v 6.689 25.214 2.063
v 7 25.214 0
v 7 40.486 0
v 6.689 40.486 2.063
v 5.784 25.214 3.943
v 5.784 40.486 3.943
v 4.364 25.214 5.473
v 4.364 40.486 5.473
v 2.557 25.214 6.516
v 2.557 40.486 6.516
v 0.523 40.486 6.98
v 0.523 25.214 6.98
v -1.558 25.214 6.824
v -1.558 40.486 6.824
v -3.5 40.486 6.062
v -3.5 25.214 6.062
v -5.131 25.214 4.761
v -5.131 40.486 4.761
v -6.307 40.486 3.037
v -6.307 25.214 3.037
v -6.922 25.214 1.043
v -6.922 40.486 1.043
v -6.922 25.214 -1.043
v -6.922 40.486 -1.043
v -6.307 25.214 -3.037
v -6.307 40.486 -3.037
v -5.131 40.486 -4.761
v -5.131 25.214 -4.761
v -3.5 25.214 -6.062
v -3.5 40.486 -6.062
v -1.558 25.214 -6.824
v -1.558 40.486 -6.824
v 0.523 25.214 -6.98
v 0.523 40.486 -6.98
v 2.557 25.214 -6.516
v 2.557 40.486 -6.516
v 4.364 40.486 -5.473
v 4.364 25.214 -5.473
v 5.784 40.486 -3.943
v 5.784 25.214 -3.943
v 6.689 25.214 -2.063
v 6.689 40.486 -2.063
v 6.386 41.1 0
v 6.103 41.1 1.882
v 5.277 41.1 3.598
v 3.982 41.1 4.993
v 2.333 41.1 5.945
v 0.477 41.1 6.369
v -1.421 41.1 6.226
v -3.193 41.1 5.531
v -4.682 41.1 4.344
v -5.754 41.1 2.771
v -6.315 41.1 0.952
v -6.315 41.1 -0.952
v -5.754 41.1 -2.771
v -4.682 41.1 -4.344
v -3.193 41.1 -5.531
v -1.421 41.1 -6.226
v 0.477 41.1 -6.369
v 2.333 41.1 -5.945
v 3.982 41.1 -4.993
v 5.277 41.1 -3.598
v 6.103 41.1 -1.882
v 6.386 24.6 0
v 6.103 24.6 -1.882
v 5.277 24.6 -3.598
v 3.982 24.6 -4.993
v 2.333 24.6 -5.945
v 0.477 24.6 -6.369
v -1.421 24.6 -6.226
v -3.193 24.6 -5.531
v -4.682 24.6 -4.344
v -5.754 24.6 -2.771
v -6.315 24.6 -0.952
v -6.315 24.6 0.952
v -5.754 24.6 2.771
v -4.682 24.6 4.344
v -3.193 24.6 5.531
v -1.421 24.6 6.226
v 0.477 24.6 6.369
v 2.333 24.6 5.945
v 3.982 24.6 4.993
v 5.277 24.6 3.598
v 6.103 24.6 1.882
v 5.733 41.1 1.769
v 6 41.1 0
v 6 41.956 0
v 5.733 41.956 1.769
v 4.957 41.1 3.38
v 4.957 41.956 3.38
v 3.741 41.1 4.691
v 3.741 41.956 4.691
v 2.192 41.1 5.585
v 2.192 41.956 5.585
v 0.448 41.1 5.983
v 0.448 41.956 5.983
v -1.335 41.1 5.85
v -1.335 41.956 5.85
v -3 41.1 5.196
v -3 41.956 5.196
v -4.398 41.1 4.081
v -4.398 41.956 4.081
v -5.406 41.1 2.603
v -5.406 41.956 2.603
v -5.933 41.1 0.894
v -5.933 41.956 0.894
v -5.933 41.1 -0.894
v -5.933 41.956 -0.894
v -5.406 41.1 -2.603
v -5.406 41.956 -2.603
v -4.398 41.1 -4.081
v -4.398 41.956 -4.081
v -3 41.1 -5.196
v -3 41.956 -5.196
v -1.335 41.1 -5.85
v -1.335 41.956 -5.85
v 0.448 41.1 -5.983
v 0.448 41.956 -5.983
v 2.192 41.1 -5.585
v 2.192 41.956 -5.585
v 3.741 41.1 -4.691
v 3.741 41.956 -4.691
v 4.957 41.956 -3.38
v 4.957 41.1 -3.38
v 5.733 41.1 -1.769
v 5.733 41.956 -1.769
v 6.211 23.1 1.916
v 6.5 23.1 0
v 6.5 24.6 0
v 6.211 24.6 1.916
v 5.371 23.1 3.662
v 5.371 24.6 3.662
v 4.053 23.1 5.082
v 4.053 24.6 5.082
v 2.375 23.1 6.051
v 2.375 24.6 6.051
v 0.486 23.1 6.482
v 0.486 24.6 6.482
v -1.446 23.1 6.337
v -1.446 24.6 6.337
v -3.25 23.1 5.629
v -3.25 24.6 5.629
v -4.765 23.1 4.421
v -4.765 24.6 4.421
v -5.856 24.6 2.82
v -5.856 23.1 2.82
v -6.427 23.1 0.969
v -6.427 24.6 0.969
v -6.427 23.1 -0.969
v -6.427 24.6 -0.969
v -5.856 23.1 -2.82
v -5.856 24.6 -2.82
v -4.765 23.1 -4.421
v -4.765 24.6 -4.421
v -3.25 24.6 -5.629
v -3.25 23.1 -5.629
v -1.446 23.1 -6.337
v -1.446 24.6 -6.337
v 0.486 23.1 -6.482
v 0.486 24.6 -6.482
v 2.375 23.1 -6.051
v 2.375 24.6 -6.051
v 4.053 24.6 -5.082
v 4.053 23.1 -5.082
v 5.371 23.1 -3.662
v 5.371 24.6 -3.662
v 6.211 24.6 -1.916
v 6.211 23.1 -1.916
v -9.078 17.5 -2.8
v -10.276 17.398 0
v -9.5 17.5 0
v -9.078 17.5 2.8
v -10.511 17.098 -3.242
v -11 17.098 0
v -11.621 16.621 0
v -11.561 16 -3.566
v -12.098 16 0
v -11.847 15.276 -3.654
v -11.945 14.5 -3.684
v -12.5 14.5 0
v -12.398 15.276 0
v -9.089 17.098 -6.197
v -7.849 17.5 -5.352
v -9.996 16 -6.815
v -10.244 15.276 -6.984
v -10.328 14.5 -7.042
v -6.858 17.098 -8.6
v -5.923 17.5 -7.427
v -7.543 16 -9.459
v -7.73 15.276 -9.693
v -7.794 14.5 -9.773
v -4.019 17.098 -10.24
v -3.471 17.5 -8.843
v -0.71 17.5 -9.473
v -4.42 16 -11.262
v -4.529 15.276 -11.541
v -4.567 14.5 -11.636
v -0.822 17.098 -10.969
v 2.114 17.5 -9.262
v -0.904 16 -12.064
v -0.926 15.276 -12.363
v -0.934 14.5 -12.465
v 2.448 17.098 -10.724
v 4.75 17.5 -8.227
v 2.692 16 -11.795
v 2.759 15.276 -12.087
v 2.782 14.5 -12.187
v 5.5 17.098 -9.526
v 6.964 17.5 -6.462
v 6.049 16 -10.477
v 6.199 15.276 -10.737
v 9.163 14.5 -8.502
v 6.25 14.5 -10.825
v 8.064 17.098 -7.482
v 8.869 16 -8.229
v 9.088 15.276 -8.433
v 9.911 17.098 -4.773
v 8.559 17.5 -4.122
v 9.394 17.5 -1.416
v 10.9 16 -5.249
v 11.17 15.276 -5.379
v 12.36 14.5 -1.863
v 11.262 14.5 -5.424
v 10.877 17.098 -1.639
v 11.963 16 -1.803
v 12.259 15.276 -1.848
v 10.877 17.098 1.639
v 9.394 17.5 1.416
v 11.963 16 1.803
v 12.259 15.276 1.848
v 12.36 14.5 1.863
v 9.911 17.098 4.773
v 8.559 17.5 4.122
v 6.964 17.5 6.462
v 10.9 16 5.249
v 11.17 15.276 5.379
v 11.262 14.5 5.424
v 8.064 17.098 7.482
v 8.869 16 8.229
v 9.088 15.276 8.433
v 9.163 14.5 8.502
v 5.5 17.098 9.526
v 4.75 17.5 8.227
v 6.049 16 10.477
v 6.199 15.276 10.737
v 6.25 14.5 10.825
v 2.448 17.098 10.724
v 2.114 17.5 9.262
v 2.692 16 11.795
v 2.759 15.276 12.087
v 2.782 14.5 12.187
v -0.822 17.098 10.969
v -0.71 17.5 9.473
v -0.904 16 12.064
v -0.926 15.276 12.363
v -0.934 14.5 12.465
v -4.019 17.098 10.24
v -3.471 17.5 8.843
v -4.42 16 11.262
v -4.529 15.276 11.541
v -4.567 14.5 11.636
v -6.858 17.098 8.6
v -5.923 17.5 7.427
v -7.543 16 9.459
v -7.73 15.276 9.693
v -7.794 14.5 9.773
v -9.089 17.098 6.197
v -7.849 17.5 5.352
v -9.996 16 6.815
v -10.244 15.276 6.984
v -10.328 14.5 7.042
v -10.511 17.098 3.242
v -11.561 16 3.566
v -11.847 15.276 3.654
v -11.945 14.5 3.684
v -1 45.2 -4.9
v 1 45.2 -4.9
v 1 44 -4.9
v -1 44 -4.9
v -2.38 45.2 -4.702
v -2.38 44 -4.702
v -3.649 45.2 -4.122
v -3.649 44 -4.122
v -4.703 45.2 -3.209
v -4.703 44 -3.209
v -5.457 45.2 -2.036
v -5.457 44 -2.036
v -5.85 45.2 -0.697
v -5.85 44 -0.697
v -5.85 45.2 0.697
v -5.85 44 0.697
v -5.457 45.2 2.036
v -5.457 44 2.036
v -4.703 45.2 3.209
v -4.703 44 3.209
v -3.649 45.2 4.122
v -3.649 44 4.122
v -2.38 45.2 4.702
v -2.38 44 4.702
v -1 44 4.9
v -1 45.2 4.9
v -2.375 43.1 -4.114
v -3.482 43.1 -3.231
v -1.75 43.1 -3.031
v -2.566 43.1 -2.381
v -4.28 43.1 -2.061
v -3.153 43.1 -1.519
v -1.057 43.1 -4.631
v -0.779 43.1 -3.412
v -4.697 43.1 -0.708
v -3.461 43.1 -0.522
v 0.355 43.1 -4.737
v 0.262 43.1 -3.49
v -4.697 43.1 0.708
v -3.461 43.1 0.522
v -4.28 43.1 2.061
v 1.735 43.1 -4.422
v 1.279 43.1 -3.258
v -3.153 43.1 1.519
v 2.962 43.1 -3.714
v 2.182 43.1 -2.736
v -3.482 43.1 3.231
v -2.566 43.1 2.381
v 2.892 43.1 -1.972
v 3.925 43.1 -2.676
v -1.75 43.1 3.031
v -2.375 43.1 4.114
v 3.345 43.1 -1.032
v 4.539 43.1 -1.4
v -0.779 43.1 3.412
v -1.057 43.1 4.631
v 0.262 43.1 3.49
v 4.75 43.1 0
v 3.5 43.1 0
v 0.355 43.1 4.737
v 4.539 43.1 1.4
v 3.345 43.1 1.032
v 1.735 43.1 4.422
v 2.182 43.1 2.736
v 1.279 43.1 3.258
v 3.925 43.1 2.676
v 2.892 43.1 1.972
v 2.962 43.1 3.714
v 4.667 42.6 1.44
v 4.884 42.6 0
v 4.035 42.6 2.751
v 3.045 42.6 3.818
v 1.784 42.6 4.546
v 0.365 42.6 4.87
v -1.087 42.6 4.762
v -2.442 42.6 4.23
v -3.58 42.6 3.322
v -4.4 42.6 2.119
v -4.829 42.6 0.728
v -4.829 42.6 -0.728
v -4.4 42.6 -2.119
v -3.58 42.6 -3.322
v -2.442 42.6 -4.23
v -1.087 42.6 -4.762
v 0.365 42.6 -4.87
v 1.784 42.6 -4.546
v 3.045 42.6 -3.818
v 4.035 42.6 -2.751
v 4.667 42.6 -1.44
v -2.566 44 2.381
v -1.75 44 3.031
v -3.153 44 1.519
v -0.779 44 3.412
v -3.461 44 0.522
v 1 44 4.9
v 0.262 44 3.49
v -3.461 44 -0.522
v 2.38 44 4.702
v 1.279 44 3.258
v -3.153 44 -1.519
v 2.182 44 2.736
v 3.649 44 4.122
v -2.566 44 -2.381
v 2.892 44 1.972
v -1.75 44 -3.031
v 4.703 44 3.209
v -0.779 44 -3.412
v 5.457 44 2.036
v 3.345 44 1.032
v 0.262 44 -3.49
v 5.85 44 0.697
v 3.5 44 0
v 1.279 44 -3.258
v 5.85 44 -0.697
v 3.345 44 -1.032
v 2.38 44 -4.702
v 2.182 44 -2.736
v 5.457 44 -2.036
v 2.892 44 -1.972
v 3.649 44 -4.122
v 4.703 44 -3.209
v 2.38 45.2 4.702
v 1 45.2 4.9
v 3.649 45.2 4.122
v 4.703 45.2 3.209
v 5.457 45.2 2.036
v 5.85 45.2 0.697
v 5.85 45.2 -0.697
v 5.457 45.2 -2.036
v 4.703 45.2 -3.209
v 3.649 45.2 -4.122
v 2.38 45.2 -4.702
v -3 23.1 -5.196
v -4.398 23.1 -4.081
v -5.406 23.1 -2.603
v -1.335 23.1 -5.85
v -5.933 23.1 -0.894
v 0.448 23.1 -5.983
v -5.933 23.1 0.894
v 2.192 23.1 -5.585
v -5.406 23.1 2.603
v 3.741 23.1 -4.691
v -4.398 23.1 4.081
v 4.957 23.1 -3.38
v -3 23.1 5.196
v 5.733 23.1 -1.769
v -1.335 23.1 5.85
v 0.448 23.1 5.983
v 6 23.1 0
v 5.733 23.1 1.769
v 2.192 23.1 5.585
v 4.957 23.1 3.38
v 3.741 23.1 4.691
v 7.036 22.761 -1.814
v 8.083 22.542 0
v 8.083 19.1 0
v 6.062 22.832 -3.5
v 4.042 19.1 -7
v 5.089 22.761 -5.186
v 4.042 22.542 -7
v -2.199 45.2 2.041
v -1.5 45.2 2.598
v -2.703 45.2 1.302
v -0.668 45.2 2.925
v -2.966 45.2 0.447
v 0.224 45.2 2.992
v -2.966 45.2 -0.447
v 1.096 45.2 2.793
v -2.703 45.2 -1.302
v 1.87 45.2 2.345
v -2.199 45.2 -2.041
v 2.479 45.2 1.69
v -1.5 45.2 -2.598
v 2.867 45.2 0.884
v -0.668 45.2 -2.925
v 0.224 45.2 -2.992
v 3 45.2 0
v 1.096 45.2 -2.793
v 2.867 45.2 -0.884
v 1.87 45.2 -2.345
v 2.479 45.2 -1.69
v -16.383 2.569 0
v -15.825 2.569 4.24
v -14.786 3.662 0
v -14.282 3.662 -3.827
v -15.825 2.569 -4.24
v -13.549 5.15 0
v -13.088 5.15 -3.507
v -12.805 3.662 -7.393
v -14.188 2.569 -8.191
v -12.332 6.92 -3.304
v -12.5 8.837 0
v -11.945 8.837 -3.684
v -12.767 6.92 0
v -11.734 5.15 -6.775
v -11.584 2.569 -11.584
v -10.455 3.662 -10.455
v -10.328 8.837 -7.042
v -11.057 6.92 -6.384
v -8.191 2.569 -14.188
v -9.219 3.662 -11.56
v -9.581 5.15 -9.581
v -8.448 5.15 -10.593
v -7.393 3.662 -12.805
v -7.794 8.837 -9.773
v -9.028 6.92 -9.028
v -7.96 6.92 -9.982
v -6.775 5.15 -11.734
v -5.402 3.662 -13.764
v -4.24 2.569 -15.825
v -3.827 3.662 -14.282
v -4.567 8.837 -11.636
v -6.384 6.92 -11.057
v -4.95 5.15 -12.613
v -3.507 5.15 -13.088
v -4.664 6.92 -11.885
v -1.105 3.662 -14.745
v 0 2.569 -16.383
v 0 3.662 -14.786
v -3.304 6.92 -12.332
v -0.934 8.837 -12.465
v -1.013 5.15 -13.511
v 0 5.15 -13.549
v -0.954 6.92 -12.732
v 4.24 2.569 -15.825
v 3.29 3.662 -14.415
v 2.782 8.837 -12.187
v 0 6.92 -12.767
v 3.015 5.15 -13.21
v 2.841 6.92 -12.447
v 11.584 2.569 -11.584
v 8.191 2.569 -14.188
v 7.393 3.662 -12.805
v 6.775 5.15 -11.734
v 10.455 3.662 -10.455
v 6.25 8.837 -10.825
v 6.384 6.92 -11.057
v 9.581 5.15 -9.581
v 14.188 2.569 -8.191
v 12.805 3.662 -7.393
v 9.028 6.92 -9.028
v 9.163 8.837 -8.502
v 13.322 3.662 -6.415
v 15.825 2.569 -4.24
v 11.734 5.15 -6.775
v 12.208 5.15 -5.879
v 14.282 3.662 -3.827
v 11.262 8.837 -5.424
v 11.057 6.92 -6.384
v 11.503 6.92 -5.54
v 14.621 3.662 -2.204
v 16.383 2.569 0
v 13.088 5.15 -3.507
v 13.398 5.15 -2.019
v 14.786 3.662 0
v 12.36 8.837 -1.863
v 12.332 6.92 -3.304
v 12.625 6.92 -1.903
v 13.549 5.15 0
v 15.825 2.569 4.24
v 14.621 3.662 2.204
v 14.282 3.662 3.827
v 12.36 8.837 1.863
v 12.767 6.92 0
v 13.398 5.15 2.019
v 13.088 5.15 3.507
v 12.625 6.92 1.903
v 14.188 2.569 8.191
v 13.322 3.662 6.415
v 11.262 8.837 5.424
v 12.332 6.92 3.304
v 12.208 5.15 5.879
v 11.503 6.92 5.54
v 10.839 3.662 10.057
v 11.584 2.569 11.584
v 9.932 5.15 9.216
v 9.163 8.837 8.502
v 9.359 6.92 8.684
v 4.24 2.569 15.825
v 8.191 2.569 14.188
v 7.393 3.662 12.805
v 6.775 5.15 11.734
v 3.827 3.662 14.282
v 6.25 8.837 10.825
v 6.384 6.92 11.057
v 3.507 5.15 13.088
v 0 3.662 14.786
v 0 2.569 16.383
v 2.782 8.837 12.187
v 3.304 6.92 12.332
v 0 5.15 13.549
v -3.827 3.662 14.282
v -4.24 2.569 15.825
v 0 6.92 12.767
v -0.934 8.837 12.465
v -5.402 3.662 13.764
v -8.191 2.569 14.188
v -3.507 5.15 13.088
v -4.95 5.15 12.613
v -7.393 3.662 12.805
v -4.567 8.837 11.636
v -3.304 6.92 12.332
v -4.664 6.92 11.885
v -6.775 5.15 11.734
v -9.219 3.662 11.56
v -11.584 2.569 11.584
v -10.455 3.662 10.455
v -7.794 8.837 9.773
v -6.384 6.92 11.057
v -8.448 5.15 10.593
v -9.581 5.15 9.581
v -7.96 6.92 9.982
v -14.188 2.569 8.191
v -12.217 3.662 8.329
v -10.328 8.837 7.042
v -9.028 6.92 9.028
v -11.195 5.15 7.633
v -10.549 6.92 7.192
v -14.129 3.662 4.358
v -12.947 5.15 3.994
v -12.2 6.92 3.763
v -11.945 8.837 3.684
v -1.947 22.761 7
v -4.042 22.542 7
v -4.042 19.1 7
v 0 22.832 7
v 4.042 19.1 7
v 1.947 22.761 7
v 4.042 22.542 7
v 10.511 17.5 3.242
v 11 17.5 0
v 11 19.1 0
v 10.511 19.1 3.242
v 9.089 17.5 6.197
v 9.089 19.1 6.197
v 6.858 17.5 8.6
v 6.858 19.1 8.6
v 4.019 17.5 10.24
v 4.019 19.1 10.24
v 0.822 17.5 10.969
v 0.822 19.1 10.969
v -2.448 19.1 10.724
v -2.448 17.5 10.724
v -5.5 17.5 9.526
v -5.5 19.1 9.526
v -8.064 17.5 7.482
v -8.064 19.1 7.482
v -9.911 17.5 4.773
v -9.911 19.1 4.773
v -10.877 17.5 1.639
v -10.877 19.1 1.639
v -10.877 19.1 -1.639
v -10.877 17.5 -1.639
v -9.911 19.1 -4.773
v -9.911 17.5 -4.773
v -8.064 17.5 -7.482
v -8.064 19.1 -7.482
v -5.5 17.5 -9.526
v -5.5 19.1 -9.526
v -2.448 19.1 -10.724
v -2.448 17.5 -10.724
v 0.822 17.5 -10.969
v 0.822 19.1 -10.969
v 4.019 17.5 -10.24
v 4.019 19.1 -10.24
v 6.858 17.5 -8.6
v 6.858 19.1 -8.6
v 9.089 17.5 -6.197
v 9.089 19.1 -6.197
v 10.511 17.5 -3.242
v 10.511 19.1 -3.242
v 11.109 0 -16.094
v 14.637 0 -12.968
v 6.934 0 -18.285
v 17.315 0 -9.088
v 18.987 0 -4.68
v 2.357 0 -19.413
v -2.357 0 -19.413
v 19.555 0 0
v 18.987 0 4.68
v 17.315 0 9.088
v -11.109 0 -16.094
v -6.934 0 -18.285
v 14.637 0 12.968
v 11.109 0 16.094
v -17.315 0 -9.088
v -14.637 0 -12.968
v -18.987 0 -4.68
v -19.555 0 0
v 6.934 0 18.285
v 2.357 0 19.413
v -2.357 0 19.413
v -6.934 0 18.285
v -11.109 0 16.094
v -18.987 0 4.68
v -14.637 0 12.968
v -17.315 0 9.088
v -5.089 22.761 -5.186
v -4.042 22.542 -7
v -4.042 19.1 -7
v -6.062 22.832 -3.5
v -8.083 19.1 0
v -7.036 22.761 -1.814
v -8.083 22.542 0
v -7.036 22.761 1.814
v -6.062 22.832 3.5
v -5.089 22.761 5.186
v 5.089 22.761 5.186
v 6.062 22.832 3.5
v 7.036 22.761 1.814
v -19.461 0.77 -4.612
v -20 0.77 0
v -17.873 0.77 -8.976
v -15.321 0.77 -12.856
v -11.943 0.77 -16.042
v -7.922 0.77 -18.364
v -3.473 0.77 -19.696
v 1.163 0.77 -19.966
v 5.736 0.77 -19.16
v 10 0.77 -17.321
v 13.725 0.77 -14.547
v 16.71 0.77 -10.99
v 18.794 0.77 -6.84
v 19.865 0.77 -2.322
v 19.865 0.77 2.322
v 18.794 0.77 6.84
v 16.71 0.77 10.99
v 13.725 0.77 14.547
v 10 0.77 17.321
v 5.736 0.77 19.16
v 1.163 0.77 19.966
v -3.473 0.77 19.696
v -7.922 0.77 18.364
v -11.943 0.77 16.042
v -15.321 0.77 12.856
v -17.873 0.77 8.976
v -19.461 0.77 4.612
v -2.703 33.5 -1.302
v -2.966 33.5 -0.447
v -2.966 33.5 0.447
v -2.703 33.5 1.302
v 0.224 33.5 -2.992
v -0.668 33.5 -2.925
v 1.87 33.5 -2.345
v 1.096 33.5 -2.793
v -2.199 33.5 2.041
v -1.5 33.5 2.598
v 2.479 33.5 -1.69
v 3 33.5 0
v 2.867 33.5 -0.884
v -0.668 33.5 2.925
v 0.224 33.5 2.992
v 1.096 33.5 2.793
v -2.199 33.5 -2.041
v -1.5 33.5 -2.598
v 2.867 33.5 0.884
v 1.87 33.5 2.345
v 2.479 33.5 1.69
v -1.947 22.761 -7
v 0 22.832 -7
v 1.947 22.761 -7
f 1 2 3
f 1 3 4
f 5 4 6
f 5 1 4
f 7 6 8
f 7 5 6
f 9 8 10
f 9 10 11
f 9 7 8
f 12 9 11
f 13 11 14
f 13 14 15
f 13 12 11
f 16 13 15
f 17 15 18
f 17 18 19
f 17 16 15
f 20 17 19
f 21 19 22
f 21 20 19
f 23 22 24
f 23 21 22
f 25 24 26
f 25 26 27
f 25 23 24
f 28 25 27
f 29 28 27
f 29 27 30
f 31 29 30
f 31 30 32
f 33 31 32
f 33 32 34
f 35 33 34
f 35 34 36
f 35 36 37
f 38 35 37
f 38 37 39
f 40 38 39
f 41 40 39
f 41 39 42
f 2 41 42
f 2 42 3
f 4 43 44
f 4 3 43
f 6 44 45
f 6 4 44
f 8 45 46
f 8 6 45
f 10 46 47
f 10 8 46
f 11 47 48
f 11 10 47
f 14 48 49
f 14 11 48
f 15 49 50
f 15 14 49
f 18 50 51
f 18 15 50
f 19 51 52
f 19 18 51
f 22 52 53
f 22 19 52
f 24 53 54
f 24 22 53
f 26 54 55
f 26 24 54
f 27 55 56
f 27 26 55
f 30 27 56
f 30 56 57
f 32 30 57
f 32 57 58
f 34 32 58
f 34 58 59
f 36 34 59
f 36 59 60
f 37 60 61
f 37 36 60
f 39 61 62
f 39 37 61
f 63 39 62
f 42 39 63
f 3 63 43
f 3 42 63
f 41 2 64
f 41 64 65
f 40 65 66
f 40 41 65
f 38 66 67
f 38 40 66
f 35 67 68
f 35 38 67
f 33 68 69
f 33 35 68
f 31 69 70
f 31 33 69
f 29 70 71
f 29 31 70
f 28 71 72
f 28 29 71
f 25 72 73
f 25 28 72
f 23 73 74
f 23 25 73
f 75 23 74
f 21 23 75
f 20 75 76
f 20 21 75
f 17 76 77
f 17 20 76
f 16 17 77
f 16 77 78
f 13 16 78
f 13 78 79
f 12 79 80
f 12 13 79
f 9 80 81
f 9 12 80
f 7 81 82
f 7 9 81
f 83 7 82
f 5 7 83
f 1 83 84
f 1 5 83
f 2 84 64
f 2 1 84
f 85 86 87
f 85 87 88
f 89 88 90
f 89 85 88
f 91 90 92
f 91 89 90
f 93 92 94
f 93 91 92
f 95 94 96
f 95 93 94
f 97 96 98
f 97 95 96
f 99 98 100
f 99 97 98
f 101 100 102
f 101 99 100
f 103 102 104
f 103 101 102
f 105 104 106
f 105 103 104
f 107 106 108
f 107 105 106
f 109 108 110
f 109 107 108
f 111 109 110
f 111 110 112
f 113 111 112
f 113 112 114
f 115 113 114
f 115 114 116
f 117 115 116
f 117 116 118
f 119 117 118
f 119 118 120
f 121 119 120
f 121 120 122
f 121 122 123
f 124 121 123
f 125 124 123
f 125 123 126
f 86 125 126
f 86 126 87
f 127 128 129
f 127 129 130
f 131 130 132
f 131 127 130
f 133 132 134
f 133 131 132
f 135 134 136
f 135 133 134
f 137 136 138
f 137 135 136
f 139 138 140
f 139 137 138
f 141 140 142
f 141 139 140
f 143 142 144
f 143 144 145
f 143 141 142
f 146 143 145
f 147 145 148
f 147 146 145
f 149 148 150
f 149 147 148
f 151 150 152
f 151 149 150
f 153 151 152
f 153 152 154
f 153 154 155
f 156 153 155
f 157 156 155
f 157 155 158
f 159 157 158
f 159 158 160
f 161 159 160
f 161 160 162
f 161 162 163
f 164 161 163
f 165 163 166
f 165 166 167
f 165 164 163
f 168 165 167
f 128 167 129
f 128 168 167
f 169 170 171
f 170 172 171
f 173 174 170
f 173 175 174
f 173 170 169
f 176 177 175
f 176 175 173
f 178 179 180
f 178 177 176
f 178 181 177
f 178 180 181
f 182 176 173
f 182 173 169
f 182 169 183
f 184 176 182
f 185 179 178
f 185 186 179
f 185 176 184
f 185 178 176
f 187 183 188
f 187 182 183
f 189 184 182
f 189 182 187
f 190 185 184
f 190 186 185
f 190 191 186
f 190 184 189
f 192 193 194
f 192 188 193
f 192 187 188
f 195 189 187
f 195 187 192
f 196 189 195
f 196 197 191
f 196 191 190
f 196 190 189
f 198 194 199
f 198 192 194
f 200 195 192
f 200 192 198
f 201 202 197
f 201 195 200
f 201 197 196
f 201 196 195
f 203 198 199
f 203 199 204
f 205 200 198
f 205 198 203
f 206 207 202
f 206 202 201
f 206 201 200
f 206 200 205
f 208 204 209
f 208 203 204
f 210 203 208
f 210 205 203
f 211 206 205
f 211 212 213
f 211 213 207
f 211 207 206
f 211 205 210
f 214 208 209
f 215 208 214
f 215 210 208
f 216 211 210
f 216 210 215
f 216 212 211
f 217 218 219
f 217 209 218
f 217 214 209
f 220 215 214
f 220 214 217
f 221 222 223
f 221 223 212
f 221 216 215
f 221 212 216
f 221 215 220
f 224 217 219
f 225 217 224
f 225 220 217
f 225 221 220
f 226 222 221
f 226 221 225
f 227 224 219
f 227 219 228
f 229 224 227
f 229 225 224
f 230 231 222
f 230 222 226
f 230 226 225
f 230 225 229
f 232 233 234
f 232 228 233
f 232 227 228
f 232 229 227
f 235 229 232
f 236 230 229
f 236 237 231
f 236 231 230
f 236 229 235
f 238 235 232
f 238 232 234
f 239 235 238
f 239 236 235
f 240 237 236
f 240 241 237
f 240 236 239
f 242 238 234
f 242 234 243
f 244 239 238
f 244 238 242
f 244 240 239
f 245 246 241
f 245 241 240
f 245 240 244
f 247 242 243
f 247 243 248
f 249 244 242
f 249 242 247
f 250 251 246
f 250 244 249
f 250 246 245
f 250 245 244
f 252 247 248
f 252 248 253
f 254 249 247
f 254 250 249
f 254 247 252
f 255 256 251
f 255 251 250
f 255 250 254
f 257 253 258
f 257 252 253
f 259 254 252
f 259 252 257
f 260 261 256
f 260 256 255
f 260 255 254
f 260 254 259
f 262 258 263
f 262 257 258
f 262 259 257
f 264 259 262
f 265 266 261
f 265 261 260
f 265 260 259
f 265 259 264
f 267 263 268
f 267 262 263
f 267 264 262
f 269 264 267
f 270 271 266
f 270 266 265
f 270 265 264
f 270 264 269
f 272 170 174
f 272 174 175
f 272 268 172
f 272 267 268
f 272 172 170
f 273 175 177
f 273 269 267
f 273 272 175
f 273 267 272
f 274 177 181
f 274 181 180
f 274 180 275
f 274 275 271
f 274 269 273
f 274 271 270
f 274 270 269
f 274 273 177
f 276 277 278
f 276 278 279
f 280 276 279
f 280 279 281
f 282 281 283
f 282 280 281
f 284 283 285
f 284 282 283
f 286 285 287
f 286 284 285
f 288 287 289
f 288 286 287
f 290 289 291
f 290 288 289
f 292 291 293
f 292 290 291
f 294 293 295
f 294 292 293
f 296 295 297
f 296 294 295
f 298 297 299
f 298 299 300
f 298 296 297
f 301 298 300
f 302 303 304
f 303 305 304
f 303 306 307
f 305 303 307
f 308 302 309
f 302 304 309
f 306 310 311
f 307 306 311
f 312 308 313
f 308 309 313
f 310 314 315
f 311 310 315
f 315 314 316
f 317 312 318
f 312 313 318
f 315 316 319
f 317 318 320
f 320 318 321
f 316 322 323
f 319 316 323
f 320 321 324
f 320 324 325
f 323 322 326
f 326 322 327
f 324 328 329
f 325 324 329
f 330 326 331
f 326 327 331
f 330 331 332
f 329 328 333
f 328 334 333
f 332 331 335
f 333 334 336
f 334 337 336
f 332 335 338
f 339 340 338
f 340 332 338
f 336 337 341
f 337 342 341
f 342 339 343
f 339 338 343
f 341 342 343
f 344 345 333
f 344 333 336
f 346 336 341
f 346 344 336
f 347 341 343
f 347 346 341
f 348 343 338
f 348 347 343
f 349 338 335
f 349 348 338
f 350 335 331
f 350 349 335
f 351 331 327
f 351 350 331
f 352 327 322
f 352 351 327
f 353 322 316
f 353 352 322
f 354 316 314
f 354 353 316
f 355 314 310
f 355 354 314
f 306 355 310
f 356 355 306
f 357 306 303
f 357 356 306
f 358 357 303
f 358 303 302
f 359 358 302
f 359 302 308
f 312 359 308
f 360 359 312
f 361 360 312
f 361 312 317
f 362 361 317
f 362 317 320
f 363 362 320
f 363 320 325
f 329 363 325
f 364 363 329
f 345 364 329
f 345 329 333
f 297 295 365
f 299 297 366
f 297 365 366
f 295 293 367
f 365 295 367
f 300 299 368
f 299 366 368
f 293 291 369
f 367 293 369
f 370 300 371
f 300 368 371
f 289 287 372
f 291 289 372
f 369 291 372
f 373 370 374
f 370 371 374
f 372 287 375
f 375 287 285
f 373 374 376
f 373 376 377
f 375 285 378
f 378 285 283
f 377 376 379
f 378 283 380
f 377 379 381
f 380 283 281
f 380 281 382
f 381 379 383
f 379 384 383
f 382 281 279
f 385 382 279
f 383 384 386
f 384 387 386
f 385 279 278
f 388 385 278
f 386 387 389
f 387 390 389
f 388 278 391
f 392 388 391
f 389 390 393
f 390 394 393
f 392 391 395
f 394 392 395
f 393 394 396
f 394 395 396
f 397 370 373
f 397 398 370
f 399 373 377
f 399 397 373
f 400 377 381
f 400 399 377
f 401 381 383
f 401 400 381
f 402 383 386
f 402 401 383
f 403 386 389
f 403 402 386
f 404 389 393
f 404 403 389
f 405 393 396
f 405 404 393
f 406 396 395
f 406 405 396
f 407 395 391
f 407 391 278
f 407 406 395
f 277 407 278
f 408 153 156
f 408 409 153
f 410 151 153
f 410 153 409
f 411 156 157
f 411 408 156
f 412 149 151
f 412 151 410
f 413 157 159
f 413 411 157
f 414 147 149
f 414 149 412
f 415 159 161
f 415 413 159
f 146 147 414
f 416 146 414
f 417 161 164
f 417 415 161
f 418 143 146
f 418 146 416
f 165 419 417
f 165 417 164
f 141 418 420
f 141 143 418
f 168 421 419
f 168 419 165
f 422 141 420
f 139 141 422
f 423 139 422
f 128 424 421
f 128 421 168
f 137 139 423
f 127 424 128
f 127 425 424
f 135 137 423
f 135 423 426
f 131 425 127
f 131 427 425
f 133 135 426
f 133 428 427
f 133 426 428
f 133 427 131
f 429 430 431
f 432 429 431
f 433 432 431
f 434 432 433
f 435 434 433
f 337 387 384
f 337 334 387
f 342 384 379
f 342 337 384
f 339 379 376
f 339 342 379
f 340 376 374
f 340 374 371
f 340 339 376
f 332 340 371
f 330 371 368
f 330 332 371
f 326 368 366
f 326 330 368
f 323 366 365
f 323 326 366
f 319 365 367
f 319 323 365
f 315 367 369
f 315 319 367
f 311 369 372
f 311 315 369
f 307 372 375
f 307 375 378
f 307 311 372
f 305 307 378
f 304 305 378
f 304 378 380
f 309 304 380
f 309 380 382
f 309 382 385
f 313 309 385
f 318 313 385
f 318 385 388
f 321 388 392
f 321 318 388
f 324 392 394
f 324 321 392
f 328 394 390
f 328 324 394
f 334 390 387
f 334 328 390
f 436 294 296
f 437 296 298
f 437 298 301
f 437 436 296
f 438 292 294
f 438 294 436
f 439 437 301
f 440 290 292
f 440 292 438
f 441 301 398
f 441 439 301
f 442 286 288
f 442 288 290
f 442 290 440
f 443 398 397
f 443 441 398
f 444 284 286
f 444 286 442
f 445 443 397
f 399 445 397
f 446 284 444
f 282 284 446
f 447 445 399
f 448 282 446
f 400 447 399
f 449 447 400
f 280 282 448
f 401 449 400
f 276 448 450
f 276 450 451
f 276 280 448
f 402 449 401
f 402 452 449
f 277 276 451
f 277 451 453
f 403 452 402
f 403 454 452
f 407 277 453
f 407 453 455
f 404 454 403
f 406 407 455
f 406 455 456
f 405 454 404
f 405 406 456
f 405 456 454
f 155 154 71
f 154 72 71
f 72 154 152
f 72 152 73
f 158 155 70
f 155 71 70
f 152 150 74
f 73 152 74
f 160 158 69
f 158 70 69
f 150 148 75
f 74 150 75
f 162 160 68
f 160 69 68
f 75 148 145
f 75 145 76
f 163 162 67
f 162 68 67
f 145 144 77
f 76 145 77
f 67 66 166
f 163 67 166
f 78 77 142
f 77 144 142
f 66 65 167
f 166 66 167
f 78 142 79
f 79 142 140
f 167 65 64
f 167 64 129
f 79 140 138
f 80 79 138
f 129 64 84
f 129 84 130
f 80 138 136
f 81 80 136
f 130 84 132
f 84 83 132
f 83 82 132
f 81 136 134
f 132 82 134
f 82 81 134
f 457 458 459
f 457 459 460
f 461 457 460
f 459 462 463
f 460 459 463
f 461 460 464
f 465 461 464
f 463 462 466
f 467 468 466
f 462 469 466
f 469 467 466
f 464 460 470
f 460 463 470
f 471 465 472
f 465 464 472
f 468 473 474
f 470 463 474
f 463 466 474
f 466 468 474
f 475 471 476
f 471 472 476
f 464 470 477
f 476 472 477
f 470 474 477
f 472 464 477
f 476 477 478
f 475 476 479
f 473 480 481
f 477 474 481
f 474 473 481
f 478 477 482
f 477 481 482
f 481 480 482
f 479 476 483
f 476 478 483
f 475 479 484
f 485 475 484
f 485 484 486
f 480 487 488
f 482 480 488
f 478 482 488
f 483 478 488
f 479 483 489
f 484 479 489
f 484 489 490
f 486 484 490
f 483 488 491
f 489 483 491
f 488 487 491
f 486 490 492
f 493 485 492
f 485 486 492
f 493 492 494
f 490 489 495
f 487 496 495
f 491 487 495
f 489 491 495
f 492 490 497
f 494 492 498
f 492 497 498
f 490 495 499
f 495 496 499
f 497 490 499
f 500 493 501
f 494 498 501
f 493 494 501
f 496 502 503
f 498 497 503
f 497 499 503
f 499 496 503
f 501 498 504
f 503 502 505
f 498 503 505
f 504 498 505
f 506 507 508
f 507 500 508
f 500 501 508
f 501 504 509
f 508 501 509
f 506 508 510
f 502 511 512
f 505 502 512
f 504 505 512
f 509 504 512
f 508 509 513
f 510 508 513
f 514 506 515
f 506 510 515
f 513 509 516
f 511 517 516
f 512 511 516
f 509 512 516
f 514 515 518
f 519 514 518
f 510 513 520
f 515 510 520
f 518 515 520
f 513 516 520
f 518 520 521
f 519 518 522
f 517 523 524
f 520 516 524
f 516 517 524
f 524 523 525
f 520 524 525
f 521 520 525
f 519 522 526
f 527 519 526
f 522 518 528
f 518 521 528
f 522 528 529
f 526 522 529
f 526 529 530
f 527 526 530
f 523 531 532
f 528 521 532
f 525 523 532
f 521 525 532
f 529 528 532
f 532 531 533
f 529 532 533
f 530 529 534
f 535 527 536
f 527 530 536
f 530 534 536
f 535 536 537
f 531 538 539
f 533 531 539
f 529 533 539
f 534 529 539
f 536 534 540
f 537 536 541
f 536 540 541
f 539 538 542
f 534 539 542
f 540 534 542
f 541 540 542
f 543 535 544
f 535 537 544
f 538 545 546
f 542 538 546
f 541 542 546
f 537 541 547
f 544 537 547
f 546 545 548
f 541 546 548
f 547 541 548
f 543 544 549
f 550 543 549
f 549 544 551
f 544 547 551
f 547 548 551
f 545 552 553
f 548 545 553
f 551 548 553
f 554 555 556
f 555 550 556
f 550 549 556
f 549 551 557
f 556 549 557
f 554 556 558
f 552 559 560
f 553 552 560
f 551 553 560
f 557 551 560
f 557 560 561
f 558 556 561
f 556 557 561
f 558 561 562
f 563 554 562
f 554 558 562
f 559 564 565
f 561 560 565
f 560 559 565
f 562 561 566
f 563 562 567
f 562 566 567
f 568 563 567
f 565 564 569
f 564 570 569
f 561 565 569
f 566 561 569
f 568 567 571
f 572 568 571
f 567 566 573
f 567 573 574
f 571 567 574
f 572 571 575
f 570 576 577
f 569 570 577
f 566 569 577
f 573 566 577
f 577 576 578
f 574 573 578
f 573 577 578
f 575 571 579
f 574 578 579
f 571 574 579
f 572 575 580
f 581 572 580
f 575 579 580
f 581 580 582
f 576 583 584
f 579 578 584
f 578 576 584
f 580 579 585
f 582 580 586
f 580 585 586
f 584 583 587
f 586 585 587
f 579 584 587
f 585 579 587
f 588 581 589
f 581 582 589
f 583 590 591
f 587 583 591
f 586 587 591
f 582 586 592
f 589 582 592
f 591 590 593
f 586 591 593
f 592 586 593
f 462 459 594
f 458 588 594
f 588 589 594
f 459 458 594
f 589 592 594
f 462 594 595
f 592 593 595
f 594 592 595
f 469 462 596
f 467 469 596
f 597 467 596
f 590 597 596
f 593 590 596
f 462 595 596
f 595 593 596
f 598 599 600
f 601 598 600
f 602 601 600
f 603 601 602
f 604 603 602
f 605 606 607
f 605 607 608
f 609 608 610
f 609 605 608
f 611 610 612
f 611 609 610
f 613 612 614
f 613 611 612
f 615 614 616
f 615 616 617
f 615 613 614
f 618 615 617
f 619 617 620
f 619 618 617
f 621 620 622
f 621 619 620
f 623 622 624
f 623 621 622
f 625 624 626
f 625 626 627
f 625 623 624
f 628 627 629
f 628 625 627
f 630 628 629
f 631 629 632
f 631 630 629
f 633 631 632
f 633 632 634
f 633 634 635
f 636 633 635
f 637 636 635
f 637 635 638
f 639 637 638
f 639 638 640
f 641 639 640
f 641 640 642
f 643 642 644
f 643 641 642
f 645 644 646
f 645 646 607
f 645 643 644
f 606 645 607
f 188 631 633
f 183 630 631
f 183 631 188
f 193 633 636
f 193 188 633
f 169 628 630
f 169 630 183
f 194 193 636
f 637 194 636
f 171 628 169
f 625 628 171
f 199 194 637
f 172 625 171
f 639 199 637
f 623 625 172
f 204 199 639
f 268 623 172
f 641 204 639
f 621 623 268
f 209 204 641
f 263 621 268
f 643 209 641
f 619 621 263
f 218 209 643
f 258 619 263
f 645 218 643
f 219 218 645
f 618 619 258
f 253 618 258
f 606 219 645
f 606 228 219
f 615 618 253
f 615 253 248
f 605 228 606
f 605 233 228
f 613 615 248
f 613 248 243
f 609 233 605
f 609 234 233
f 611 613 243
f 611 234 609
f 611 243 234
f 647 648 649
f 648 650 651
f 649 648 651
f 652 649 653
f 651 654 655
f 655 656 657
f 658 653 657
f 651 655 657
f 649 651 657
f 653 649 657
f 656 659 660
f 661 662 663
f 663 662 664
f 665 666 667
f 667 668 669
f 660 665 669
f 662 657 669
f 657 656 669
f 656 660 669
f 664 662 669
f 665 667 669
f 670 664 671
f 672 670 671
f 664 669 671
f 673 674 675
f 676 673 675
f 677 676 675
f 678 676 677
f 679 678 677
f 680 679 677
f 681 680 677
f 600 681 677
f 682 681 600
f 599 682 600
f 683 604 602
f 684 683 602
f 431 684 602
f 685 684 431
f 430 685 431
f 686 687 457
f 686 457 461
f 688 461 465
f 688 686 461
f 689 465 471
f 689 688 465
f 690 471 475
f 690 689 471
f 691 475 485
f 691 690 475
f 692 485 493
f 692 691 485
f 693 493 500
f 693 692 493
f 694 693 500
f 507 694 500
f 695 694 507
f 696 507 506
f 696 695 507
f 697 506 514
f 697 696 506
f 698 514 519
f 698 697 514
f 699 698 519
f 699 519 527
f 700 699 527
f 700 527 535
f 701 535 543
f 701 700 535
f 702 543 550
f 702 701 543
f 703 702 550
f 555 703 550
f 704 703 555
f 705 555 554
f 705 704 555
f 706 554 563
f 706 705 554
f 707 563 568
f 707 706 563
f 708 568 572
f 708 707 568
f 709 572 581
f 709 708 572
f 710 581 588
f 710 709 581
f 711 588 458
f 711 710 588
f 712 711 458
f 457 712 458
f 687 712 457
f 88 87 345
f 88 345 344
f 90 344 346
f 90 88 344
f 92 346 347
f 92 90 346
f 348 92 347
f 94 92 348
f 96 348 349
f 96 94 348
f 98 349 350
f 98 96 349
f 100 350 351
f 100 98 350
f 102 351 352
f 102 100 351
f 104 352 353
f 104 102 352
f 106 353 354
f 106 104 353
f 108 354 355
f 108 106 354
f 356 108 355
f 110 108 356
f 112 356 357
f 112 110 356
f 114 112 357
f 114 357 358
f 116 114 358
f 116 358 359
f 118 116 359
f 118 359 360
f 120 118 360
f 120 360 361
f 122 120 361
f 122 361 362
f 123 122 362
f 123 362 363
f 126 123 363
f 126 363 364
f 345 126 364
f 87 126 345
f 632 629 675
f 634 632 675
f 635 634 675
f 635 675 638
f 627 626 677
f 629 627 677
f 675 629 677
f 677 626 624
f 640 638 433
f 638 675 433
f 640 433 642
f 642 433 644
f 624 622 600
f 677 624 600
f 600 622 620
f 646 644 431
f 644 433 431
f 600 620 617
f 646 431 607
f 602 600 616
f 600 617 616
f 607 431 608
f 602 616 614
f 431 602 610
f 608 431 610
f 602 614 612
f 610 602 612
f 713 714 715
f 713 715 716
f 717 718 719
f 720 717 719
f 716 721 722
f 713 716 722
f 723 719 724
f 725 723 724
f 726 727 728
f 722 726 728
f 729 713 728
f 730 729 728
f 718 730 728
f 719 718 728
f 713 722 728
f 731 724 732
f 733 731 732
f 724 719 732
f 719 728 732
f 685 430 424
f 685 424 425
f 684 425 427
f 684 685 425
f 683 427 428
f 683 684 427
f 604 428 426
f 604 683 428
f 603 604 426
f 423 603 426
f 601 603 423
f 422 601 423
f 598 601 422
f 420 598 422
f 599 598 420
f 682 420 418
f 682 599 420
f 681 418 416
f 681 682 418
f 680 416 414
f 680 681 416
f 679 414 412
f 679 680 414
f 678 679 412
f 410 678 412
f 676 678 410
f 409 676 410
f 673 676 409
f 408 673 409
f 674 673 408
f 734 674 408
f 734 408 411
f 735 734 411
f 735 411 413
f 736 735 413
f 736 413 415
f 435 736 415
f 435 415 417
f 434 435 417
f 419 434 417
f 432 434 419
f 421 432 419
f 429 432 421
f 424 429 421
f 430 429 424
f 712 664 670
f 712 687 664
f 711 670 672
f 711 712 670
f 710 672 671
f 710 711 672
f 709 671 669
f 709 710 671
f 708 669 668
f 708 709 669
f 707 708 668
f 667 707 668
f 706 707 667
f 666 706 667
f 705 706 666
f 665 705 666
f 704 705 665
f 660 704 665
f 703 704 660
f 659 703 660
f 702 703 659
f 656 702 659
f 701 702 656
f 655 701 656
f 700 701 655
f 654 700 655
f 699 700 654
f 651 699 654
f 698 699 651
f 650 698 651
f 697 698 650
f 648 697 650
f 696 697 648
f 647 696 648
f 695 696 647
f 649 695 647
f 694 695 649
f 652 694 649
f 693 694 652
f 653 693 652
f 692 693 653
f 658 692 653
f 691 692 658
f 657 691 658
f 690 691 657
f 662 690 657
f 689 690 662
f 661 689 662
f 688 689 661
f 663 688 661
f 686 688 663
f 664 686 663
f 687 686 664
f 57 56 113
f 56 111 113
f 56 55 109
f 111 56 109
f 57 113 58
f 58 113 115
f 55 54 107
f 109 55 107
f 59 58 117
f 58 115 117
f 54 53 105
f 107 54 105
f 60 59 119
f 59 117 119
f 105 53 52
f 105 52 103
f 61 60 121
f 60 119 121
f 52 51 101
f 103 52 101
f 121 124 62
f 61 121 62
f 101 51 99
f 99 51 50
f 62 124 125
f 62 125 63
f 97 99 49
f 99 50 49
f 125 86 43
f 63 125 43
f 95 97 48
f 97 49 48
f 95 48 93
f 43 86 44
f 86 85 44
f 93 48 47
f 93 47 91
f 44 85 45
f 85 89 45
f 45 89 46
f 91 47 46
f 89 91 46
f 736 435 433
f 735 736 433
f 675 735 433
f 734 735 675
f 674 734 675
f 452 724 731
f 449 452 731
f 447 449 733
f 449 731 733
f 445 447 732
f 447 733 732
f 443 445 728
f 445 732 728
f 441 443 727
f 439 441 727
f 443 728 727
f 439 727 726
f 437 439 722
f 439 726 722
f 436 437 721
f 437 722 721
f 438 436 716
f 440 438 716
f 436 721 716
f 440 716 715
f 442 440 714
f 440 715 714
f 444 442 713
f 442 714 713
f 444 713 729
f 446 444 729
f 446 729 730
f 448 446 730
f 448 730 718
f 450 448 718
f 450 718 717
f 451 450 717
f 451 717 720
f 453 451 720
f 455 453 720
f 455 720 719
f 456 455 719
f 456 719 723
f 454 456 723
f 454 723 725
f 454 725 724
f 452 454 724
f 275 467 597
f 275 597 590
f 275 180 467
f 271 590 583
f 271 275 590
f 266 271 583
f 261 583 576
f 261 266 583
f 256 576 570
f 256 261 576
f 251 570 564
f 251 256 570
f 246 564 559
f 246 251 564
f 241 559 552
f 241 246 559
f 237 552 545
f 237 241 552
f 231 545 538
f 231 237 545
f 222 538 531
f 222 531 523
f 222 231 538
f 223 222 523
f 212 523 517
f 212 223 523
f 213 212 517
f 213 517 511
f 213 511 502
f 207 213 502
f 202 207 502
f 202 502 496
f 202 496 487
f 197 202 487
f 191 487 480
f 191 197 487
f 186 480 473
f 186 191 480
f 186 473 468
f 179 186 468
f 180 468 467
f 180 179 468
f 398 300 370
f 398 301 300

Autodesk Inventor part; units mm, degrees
sketch "Sketch_1" plane through (0, 45.2, 0) normal (0, 1, 0) x (1, 0, 0)
  arc A0 (-1, 4.9) -> (-1, -4.9) centre (-1, 0) ccw
  line L0 (-1, -4.9) -> (1, -4.9)
  arc A1 (1, -4.9) -> (1, 4.9) centre (1, 0) ccw
  line L1 (1, 4.9) -> (-1, 4.9)
extrude "Extrusion1" add sketch "Sketch_1" against normal blind 1.2
sketch "Sketch_2" plane through (0, 0, 0) normal (0, 0, 1) x (1, 0, 0)
  line L0 (0, 41.1) -> (0, 44)
  line L1 (0, 44) -> (3.5, 44)
  line L2 (3.5, 44) -> (3.5, 43.1)
  line L3 (3.5, 43.1) -> (4.75, 43.1)
  line L4 (4.75, 43.1) -> (4.884, 42.6)
  line L5 (4.884, 42.6) -> (6, 41.9557)
  line L6 (6, 41.9557) -> (6, 41.1)
  line L7 (6, 41.1) -> (0, 41.1)
  line L8 (0, 41.1) -> (0, 44)
revolve "Revolution1" add sketch "Sketch_2" angle 360 about axis through (0, 41.1, 0) along (0, -1, 0)
sketch "Sketch_5" plane through (0, 0, 0) normal (0, 0, 1) x (1, 0, 0)
  line L0 (0, 24.6) -> (0, 41.1)
  line L1 (0, 41.1) -> (6.3865, 41.1)
  line L2 (6.3865, 41.1) -> (7, 40.4865)
  line L3 (7, 40.4865) -> (7, 25.2135)
  line L4 (7, 25.2135) -> (6.3865, 24.6)
  line L5 (6.3865, 24.6) -> (0, 24.6)
  line L6 (0, 24.6) -> (0, 41.1)
revolve "Revolution2" add sketch "Sketch_5" angle 360 about axis through (0, 24.6, 0) along (0, -1, 0)
thread "Thread1" size "M14x1" class "6g" standard "ISO Metric profile" full length
sketch "Sketch_6" plane through (0, 0, 0) normal (0, 0, 1) x (1, 0, 0)
  line L0 (0, 23.1) -> (0, 24.6)
  line L1 (0, 24.6) -> (6.5, 24.6)
  line L2 (6.5, 24.6) -> (6.5, 23.1)
  line L3 (6.5, 23.1) -> (0, 23.1)
  line L4 (0, 23.1) -> (0, 24.6)
revolve "Revolution3" add sketch "Sketch_6" angle 360 about axis through (0, 23.1, 0) along (0, -1, 0)
sketch "Sketch_8" plane through (0, 0, 0) normal (0, 0, 1) x (1, 0, 0)
  line L0 (0, 17.5) -> (0, 23.1)
  line L1 (0, 23.1) -> (6, 23.1)
  line L2 (6, 23.1) -> (8.4, 22.4569)
  line L3 (8.4, 22.4569) -> (8.4, 18.1431)
  line L4 (8.4, 18.1431) -> (6, 17.5)
  line L5 (6, 17.5) -> (0, 17.5)
  line L6 (0, 17.5) -> (0, 23.1)
revolve "Revolution4" add sketch "Sketch_8" angle 360 about axis through (0, 17.5, 0) along (0, -1, 0)
sketch "Sketch_9" plane through (0, 23.1, 0) normal (0, 1, 0) x (1, 0, 0)
  line L0 (-12, -12) -> (12, -12)
  line L1 (12, -12) -> (12, 12)
  line L2 (12, 12) -> (-12, 12)
  line L3 (-12, 12) -> (-12, -12)
  line L4 (-8.0829, 0) -> (-4.0415, -7)
  line L5 (-4.0415, -7) -> (4.0415, -7)
  line L6 (4.0415, -7) -> (8.0829, 0)
  line L7 (8.0829, 0) -> (4.0415, 7)
  line L8 (4.0415, 7) -> (-4.0415, 7)
  line L9 (-4.0415, 7) -> (-8.0829, 0)
extrude "Extrusion2" cut sketch "Sketch_9" against normal blind 5.6
sketch "Sketch_10" plane through (0, 0, 0) normal (0, 0, 1) x (1, 0, 0)
  line L0 (0, 17.5) -> (0, 19.1)
  line L1 (0, 19.1) -> (11, 19.1)
  line L2 (11, 19.1) -> (11, 17.5)
  line L3 (11, 17.5) -> (0, 17.5)
  line L4 (0, 17.5) -> (0, 19.1)
revolve "Revolution5" add sketch "Sketch_10" angle 360 about axis through (0, 17.5, 0) along (0, -1, 0)
sketch "Sketch_12" plane through (0, 0, 0) normal (0, 0, 1) x (1, 0, 0)
  line L0 (0, 33.5) -> (0, 45.2)
  line L1 (0, 45.2) -> (3, 45.2)
  line L2 (3, 45.2) -> (3, 33.5)
  line L3 (3, 33.5) -> (0, 33.5)
  line L4 (0, 33.5) -> (0, 45.2)
revolve "Revolution6" cut sketch "Sketch_12" angle 360 about axis through (0, 33.5, 0) along (0, -1, 0)
sketch "Sketch_22" plane through (0, 0, 0) normal (0, 0, 1) x (1, 0, 0)
  line L0 (0, 17.5) -> (0, 0)
  line L1 (0, 0) -> (-19.5554, 0)
  line L2 (-19.5554, 0) -> (-20, 0.77)
  line L3 (-20, 0.77) -> (-16.3829, 2.5689)
  arc A0 (-16.3829, 2.5689) -> (-12.5, 8.8366) centre (-19.5, 8.8366) ccw
  line L4 (-12.5, 8.8366) -> (-12.5, 14.5)
  arc A1 (-9.5, 17.5) -> (-12.5, 14.5) centre (-9.5, 14.5) ccw
  line L5 (-9.5, 17.5) -> (0, 17.5)
  line L6 (0, 17.5) -> (0, 0)
revolve "Revolution7" add sketch "Sketch_22" angle 360 about axis through (0, 17.5, 0) along (0, 1, 0)
ref_plane "BODY_TO_PARTS_XY" through (0, 17.5, 0) normal (0, 1, 0) x (1, 0, 0)
ref_plane "BODY_TO_PARTS_YZ" through (0, 17.5, 0) normal (1, 0, 0) x (0, 0, -1)
ref_plane "BODY_TO_PARTS_ZX" through (0, 17.5, 0) normal (0, 0, -1) x (0, 1, 0)
ref_plane "body_to_nut1_XY" through (0, 30.3, 0) normal (0, 1, 0) x (1, 0, 0)
ref_plane "body_to_nut1_YZ" through (0, 30.3, 0) normal (1, 0, 0) x (0, 0, -1)
ref_plane "body_to_nut1_ZX" through (0, 30.3, 0) normal (0, 0, -1) x (0, 1, 0)
ref_plane "body_to_nut2_XY" through (0, 24.7, 0) normal (0, 1, 0) x (1, 0, 0)
ref_plane "body_to_nut2_YZ" through (0, 24.7, 0) normal (1, 0, 0) x (0, 0, -1)
ref_plane "body_to_nut2_ZX" through (0, 24.7, 0) normal (0, 0, -1) x (0, 1, 0)
ref_plane "body_to_nut3_XY" through (0, 34.6, 0) normal (0, 1, 0) x (1, 0, 0)
ref_plane "body_to_nut3_YZ" through (0, 34.6, 0) normal (1, 0, 0) x (0, 0, -1)
ref_plane "body_to_nut3_ZX" through (0, 34.6, 0) normal (0, 0, -1) x (0, 1, 0)
ref_plane "body_to_nut4_XY" through (0, 27.6, 0) normal (0, 1, 0) x (1, 0, 0)
ref_plane "body_to_nut4_YZ" through (0, 27.6, 0) normal (1, 0, 0) x (0, 0, -1)
ref_plane "body_to_nut4_ZX" through (0, 27.6, 0) normal (0, 0, -1) x (0, 1, 0)
ref_plane "作業平面17" through (0, 0, 10) normal (0, 0, 1) x (1, 0, 0)
sketch "スケッチ11" plane through (0, 0, 10) normal (0, 0, 1) x (1, 0, 0)
  arc A0 (-16.3829, 2.5689) -> (-12.5, 8.8366) centre (-19.5, 8.8366) ccw projected
  line L0 (0, 0) -> (-19.5554, 0) projected
  line L1 (-19.5554, 0) -> (-20, 0.77) projected
  line L2 (-5.9, 44) -> (-1, 44) projected
  line L3 (-1, 45.2) -> (-5.9, 45.2) projected
  line L4 (-1, 45.2) -> (-1, 44) projected
  line L5 (-4.884, 42.6) -> (4.884, 42.6) projected
  line L6 (-4.884, 42.6) -> (4.884, 42.6) projected
  line L7 (-4.75, 43.1) -> (4.75, 43.1) projected
  line L8 (-3.5, 43.1) -> (3.5, 43.1) projected
  line L9 (-4.75, 43.1) -> (4.75, 43.1) projected
  line L10 (-1, 44) -> (1, 44) projected
  line L11 (1, 44) -> (-1, 44) projected
  line L12 (3.5, 44) -> (-3.5, 44) projected
  line L13 (-3.5, 43.1) -> (3.5, 43.1) projected
  line L14 (3.5, 44) -> (-3.5, 44) projected
  line L15 (1, 44) -> (5.9, 44) projected
  line L16 (3.5, 44) -> (-3.5, 44) projected
  line L17 (-1, 44) -> (-1, 44) projected
  line L18 (-1, 44) -> (1, 44) projected
  line L19 (1, 44) -> (1, 44) projected
  line L20 (1, 44) -> (-1, 44) projected
  line L21 (-3, 45.2) -> (3, 45.2) projected
  line L22 (-1, 45.2) -> (-1, 45.2) projected
  line L23 (-1, 45.2) -> (1, 45.2) projected
  line L24 (1, 45.2) -> (1, 45.2) projected
  line L25 (1, 45.2) -> (-1, 45.2) projected
  line L26 (5.9, 45.2) -> (1, 45.2) projected
  line L27 (1, 45.2) -> (1, 45.2) projected
  line L28 (1, 45.2) -> (1, 44) projected
  line L29 (1, 44) -> (1, 44) projected
  line L30 (1, 45.2) -> (1, 44) projected
  line L31 (1, 45.2) -> (1, 44) projected
  line L32 (-1, 45.2) -> (1, 45.2) projected
  line L33 (-1, 45.2) -> (1, 45.2) projected
  line L34 (-1, 45.2) -> (-1, 44) projected
  line L35 (1, 44) -> (-1, 44) projected
  line L36 (1, 45.2) -> (1, 44) projected
  line L37 (1, 45.2) -> (-1, 45.2) projected
  line L38 (1, 45.2) -> (1, 44) projected
  line L39 (1, 45.2) -> (-1, 45.2) projected
  line L40 (1, 45.2) -> (1, 44) projected
  line L41 (-1, 44) -> (1, 44) projected
  line L42 (-1, 45.2) -> (-1, 44) projected
  line L43 (-3, 45.2) -> (3, 45.2) projected
  line L44 (-4.75, 43.1) -> (4.75, 43.1) projected
  line L45 (-3.5, 43.1) -> (3.5, 43.1) projected
  line L46 (-3, 33.5) -> (3, 33.5) projected
  line L47 (-3, 45.2) -> (3, 45.2) projected
  line L48 (-6, 41.9557) -> (6, 41.9557) projected
  line L49 (-4.884, 42.6) -> (4.884, 42.6) projected
  line L50 (-6, 41.9557) -> (6, 41.9557) projected
  line L51 (-6, 41.1) -> (6, 41.1) projected
  line L52 (-6, 41.9557) -> (6, 41.9557) projected
  line L53 (-6, 41.1) -> (6, 41.1) projected
  line L54 (-3, 33.5) -> (3, 33.5) projected
  line L55 (-3, 33.5) -> (3, 33.5) projected
  line L56 (-6.3865, 41.1) -> (6.3865, 41.1) projected
  line L57 (-6.3865, 41.1) -> (6.3865, 41.1) projected
  line L58 (-6, 41.1) -> (6, 41.1) projected
  line L59 (-7, 40.4865) -> (7, 40.4865) projected
  line L60 (-7, 25.2135) -> (7, 25.2135) projected
  line L61 (-7, 40.4865) -> (7, 40.4865) projected
  line L62 (-7, 40.4865) -> (7, 40.4865) projected
  line L63 (-6.3865, 41.1) -> (6.3865, 41.1) projected
  line L64 (-7, 25.2135) -> (7, 25.2135) projected
  line L65 (-6.5, 23.1) -> (6.5, 23.1) projected
  line L66 (-6.3865, 24.6) -> (6.3865, 24.6) projected
  line L67 (-6.5, 24.6) -> (6.5, 24.6) projected
  line L68 (6, 23.1) -> (-6, 23.1) projected
  line L69 (-8.0829, 22.5419) -> (-8.0829, 19.1) projected
  line L70 (-4.0415, 22.5419) -> (-4.0415, 19.1) projected
  line L71 (4.0415, 22.5419) -> (4.0415, 19.1) projected
  line L72 (8.0829, 22.5419) -> (8.0829, 19.1) projected
  line L73 (-4.0415, 22.5419) -> (-4.0415, 19.1) projected
  line L74 (4.0415, 22.5419) -> (4.0415, 19.1) projected
  line L75 (4.0415, 19.1) -> (-4.0415, 19.1) projected
  line L76 (4.0415, 19.1) -> (-4.0415, 19.1) projected
  line L77 (-4.0415, 22.5419) -> (-4.0415, 19.1) projected
  line L78 (4.0415, 22.5419) -> (4.0415, 19.1) projected
  line L79 (-6.5, 24.6) -> (6.5, 24.6) projected
  line L80 (-6.3865, 24.6) -> (6.3865, 24.6) projected
  line L81 (-6.3865, 24.6) -> (6.3865, 24.6) projected
  line L82 (-7, 25.2135) -> (7, 25.2135) projected
  line L83 (-6.5, 23.1) -> (6.5, 23.1) projected
  line L84 (-6.5, 24.6) -> (6.5, 24.6) projected
  line L85 (-4.0415, 19.1) -> (-8.0829, 19.1) projected
  line L86 (8.0829, 19.1) -> (4.0415, 19.1) projected
  line L87 (8.0829, 19.1) -> (4.0415, 19.1) projected
  line L88 (4.0415, 22.5419) -> (4.0415, 19.1) projected
  line L89 (8.0829, 22.5419) -> (8.0829, 19.1) projected
  line L90 (-4.0415, 19.1) -> (-8.0829, 19.1) projected
  line L91 (-8.0829, 22.5419) -> (-8.0829, 19.1) projected
  line L92 (-4.0415, 22.5419) -> (-4.0415, 19.1) projected
  line L93 (-8.0829, 19.1) -> (-4.0415, 19.1) projected
  line L94 (-8.0829, 19.1) -> (-4.0415, 19.1) projected
  line L95 (-4.0415, 22.5419) -> (-4.0415, 19.1) projected
  line L96 (-8.0829, 22.5419) -> (-8.0829, 19.1) projected
  line L97 (6, 23.1) -> (-6, 23.1) projected
  line L98 (-4.0415, 19.1) -> (4.0415, 19.1) projected
  line L99 (-4.0415, 19.1) -> (4.0415, 19.1) projected
  line L100 (4.0415, 22.5419) -> (4.0415, 19.1) projected
  line L101 (-4.0415, 22.5419) -> (-4.0415, 19.1) projected
  line L102 (6, 23.1) -> (-6, 23.1) projected
  line L103 (-6.5, 23.1) -> (6.5, 23.1) projected
  line L104 (4.0415, 19.1) -> (8.0829, 19.1) projected
  line L105 (4.0415, 19.1) -> (8.0829, 19.1) projected
  line L106 (8.0829, 22.5419) -> (8.0829, 19.1) projected
  line L107 (4.0415, 22.5419) -> (4.0415, 19.1) projected
  line L108 (-1, 45.2) -> (-1, 44) projected
  line L109 (-1, 45.2) -> (-1, 45.2) projected
  line L110 (-1, 45.2) -> (-1, 44) projected
  line L111 (-1, 44) -> (-1, 44) projected
  line L112 (-1, 45.2) -> (-1, 44) projected
  line L113 (-11, 19.1) -> (11, 19.1) projected
  line L114 (-11, 17.5) -> (11, 17.5) projected
  line L115 (-9.5, 17.5) -> (9.5, 17.5) projected
  line L116 (12.5, 14.5) -> (-12.5, 14.5) projected
  line L117 (12.5, 8.8366) -> (-12.5, 8.8366) projected
  line L118 (-11, 19.1) -> (11, 19.1) projected
  line L119 (4.0415, 19.1) -> (-4.0415, 19.1) projected
  line L120 (8.0829, 19.1) -> (4.0415, 19.1) projected
  line L121 (4.0415, 19.1) -> (8.0829, 19.1) projected
  line L122 (-4.0415, 19.1) -> (4.0415, 19.1) projected
  line L123 (-8.0829, 19.1) -> (-4.0415, 19.1) projected
  line L124 (-4.0415, 19.1) -> (-8.0829, 19.1) projected
  line L125 (-11, 17.5) -> (11, 17.5) projected
  line L126 (-11, 19.1) -> (11, 19.1) projected
  line L127 (-9.5, 17.5) -> (9.5, 17.5) projected
  line L128 (12.5, 14.5) -> (-12.5, 14.5) projected
  line L129 (12.5, 14.5) -> (-12.5, 14.5) projected
  line L130 (12.5, 8.8366) -> (-12.5, 8.8366) projected
  line L131 (-11, 17.5) -> (11, 17.5) projected
  line L132 (-9.5, 17.5) -> (9.5, 17.5) projected
  line L133 (0, 17.5) -> (0, 19.1) projected
  line L134 (0, 19.1) -> (11, 19.1) projected
  line L135 (11, 19.1) -> (11, 17.5) projected
  line L136 (11, 17.5) -> (0, 17.5) projected
  line L137 (0, 17.5) -> (0, 19.1) projected
  line L138 (0, 33.5) -> (0, 45.2) projected
  line L139 (0, 45.2) -> (3, 45.2) projected
  line L140 (3, 45.2) -> (3, 33.5) projected
  line L141 (3, 33.5) -> (0, 33.5) projected
  line L142 (0, 33.5) -> (0, 45.2) projected
  line L143 (0, 17.5) -> (0, 0) projected
  line L144 (-20, 0.77) -> (-16.3829, 2.5689) projected
  line L145 (-12.5, 8.8366) -> (-12.5, 14.5) projected
  arc A1 (-9.5, 17.5) -> (-12.5, 14.5) centre (-9.5, 14.5) ccw projected
  line L146 (-9.5, 17.5) -> (0, 17.5) projected
  line L147 (0, 17.5) -> (0, 0) projected
  line L148 (0, 17.5) -> (0, 23.1) projected
  line L149 (0, 23.1) -> (6, 23.1) projected
  line L150 (6, 23.1) -> (8.4, 22.4569) projected
  line L151 (8.4, 22.4569) -> (8.4, 18.1431) projected
  line L152 (8.4, 18.1431) -> (6, 17.5) projected
  line L153 (6, 17.5) -> (0, 17.5) projected
  line L154 (0, 17.5) -> (0, 23.1) projected
  line L155 (0, 23.1) -> (0, 24.6) projected
  line L156 (0, 24.6) -> (6.5, 24.6) projected
  line L157 (6.5, 24.6) -> (6.5, 23.1) projected
  line L158 (6.5, 23.1) -> (0, 23.1) projected
  line L159 (0, 23.1) -> (0, 24.6) projected
  line L160 (0, 24.6) -> (0, 41.1) projected
  line L161 (0, 41.1) -> (6.3865, 41.1) projected
  line L162 (6.3865, 41.1) -> (7, 40.4865) projected
  line L163 (7, 40.4865) -> (7, 25.2135) projected
  line L164 (7, 25.2135) -> (6.3865, 24.6) projected
  line L165 (6.3865, 24.6) -> (0, 24.6) projected
  line L166 (0, 24.6) -> (0, 41.1) projected
  line L167 (0, 41.1) -> (0, 44) projected
  line L168 (0, 44) -> (3.5, 44) projected
  line L169 (3.5, 44) -> (3.5, 43.1) projected
  line L170 (3.5, 43.1) -> (4.75, 43.1) projected
  line L171 (4.75, 43.1) -> (4.884, 42.6) projected
  line L172 (4.884, 42.6) -> (6, 41.9557) projected
  line L173 (6, 41.9557) -> (6, 41.1) projected
  line L174 (6, 41.1) -> (0, 41.1) projected
  line L175 (0, 41.1) -> (0, 44) projected
properties part number "MVFKN40-1-1"
